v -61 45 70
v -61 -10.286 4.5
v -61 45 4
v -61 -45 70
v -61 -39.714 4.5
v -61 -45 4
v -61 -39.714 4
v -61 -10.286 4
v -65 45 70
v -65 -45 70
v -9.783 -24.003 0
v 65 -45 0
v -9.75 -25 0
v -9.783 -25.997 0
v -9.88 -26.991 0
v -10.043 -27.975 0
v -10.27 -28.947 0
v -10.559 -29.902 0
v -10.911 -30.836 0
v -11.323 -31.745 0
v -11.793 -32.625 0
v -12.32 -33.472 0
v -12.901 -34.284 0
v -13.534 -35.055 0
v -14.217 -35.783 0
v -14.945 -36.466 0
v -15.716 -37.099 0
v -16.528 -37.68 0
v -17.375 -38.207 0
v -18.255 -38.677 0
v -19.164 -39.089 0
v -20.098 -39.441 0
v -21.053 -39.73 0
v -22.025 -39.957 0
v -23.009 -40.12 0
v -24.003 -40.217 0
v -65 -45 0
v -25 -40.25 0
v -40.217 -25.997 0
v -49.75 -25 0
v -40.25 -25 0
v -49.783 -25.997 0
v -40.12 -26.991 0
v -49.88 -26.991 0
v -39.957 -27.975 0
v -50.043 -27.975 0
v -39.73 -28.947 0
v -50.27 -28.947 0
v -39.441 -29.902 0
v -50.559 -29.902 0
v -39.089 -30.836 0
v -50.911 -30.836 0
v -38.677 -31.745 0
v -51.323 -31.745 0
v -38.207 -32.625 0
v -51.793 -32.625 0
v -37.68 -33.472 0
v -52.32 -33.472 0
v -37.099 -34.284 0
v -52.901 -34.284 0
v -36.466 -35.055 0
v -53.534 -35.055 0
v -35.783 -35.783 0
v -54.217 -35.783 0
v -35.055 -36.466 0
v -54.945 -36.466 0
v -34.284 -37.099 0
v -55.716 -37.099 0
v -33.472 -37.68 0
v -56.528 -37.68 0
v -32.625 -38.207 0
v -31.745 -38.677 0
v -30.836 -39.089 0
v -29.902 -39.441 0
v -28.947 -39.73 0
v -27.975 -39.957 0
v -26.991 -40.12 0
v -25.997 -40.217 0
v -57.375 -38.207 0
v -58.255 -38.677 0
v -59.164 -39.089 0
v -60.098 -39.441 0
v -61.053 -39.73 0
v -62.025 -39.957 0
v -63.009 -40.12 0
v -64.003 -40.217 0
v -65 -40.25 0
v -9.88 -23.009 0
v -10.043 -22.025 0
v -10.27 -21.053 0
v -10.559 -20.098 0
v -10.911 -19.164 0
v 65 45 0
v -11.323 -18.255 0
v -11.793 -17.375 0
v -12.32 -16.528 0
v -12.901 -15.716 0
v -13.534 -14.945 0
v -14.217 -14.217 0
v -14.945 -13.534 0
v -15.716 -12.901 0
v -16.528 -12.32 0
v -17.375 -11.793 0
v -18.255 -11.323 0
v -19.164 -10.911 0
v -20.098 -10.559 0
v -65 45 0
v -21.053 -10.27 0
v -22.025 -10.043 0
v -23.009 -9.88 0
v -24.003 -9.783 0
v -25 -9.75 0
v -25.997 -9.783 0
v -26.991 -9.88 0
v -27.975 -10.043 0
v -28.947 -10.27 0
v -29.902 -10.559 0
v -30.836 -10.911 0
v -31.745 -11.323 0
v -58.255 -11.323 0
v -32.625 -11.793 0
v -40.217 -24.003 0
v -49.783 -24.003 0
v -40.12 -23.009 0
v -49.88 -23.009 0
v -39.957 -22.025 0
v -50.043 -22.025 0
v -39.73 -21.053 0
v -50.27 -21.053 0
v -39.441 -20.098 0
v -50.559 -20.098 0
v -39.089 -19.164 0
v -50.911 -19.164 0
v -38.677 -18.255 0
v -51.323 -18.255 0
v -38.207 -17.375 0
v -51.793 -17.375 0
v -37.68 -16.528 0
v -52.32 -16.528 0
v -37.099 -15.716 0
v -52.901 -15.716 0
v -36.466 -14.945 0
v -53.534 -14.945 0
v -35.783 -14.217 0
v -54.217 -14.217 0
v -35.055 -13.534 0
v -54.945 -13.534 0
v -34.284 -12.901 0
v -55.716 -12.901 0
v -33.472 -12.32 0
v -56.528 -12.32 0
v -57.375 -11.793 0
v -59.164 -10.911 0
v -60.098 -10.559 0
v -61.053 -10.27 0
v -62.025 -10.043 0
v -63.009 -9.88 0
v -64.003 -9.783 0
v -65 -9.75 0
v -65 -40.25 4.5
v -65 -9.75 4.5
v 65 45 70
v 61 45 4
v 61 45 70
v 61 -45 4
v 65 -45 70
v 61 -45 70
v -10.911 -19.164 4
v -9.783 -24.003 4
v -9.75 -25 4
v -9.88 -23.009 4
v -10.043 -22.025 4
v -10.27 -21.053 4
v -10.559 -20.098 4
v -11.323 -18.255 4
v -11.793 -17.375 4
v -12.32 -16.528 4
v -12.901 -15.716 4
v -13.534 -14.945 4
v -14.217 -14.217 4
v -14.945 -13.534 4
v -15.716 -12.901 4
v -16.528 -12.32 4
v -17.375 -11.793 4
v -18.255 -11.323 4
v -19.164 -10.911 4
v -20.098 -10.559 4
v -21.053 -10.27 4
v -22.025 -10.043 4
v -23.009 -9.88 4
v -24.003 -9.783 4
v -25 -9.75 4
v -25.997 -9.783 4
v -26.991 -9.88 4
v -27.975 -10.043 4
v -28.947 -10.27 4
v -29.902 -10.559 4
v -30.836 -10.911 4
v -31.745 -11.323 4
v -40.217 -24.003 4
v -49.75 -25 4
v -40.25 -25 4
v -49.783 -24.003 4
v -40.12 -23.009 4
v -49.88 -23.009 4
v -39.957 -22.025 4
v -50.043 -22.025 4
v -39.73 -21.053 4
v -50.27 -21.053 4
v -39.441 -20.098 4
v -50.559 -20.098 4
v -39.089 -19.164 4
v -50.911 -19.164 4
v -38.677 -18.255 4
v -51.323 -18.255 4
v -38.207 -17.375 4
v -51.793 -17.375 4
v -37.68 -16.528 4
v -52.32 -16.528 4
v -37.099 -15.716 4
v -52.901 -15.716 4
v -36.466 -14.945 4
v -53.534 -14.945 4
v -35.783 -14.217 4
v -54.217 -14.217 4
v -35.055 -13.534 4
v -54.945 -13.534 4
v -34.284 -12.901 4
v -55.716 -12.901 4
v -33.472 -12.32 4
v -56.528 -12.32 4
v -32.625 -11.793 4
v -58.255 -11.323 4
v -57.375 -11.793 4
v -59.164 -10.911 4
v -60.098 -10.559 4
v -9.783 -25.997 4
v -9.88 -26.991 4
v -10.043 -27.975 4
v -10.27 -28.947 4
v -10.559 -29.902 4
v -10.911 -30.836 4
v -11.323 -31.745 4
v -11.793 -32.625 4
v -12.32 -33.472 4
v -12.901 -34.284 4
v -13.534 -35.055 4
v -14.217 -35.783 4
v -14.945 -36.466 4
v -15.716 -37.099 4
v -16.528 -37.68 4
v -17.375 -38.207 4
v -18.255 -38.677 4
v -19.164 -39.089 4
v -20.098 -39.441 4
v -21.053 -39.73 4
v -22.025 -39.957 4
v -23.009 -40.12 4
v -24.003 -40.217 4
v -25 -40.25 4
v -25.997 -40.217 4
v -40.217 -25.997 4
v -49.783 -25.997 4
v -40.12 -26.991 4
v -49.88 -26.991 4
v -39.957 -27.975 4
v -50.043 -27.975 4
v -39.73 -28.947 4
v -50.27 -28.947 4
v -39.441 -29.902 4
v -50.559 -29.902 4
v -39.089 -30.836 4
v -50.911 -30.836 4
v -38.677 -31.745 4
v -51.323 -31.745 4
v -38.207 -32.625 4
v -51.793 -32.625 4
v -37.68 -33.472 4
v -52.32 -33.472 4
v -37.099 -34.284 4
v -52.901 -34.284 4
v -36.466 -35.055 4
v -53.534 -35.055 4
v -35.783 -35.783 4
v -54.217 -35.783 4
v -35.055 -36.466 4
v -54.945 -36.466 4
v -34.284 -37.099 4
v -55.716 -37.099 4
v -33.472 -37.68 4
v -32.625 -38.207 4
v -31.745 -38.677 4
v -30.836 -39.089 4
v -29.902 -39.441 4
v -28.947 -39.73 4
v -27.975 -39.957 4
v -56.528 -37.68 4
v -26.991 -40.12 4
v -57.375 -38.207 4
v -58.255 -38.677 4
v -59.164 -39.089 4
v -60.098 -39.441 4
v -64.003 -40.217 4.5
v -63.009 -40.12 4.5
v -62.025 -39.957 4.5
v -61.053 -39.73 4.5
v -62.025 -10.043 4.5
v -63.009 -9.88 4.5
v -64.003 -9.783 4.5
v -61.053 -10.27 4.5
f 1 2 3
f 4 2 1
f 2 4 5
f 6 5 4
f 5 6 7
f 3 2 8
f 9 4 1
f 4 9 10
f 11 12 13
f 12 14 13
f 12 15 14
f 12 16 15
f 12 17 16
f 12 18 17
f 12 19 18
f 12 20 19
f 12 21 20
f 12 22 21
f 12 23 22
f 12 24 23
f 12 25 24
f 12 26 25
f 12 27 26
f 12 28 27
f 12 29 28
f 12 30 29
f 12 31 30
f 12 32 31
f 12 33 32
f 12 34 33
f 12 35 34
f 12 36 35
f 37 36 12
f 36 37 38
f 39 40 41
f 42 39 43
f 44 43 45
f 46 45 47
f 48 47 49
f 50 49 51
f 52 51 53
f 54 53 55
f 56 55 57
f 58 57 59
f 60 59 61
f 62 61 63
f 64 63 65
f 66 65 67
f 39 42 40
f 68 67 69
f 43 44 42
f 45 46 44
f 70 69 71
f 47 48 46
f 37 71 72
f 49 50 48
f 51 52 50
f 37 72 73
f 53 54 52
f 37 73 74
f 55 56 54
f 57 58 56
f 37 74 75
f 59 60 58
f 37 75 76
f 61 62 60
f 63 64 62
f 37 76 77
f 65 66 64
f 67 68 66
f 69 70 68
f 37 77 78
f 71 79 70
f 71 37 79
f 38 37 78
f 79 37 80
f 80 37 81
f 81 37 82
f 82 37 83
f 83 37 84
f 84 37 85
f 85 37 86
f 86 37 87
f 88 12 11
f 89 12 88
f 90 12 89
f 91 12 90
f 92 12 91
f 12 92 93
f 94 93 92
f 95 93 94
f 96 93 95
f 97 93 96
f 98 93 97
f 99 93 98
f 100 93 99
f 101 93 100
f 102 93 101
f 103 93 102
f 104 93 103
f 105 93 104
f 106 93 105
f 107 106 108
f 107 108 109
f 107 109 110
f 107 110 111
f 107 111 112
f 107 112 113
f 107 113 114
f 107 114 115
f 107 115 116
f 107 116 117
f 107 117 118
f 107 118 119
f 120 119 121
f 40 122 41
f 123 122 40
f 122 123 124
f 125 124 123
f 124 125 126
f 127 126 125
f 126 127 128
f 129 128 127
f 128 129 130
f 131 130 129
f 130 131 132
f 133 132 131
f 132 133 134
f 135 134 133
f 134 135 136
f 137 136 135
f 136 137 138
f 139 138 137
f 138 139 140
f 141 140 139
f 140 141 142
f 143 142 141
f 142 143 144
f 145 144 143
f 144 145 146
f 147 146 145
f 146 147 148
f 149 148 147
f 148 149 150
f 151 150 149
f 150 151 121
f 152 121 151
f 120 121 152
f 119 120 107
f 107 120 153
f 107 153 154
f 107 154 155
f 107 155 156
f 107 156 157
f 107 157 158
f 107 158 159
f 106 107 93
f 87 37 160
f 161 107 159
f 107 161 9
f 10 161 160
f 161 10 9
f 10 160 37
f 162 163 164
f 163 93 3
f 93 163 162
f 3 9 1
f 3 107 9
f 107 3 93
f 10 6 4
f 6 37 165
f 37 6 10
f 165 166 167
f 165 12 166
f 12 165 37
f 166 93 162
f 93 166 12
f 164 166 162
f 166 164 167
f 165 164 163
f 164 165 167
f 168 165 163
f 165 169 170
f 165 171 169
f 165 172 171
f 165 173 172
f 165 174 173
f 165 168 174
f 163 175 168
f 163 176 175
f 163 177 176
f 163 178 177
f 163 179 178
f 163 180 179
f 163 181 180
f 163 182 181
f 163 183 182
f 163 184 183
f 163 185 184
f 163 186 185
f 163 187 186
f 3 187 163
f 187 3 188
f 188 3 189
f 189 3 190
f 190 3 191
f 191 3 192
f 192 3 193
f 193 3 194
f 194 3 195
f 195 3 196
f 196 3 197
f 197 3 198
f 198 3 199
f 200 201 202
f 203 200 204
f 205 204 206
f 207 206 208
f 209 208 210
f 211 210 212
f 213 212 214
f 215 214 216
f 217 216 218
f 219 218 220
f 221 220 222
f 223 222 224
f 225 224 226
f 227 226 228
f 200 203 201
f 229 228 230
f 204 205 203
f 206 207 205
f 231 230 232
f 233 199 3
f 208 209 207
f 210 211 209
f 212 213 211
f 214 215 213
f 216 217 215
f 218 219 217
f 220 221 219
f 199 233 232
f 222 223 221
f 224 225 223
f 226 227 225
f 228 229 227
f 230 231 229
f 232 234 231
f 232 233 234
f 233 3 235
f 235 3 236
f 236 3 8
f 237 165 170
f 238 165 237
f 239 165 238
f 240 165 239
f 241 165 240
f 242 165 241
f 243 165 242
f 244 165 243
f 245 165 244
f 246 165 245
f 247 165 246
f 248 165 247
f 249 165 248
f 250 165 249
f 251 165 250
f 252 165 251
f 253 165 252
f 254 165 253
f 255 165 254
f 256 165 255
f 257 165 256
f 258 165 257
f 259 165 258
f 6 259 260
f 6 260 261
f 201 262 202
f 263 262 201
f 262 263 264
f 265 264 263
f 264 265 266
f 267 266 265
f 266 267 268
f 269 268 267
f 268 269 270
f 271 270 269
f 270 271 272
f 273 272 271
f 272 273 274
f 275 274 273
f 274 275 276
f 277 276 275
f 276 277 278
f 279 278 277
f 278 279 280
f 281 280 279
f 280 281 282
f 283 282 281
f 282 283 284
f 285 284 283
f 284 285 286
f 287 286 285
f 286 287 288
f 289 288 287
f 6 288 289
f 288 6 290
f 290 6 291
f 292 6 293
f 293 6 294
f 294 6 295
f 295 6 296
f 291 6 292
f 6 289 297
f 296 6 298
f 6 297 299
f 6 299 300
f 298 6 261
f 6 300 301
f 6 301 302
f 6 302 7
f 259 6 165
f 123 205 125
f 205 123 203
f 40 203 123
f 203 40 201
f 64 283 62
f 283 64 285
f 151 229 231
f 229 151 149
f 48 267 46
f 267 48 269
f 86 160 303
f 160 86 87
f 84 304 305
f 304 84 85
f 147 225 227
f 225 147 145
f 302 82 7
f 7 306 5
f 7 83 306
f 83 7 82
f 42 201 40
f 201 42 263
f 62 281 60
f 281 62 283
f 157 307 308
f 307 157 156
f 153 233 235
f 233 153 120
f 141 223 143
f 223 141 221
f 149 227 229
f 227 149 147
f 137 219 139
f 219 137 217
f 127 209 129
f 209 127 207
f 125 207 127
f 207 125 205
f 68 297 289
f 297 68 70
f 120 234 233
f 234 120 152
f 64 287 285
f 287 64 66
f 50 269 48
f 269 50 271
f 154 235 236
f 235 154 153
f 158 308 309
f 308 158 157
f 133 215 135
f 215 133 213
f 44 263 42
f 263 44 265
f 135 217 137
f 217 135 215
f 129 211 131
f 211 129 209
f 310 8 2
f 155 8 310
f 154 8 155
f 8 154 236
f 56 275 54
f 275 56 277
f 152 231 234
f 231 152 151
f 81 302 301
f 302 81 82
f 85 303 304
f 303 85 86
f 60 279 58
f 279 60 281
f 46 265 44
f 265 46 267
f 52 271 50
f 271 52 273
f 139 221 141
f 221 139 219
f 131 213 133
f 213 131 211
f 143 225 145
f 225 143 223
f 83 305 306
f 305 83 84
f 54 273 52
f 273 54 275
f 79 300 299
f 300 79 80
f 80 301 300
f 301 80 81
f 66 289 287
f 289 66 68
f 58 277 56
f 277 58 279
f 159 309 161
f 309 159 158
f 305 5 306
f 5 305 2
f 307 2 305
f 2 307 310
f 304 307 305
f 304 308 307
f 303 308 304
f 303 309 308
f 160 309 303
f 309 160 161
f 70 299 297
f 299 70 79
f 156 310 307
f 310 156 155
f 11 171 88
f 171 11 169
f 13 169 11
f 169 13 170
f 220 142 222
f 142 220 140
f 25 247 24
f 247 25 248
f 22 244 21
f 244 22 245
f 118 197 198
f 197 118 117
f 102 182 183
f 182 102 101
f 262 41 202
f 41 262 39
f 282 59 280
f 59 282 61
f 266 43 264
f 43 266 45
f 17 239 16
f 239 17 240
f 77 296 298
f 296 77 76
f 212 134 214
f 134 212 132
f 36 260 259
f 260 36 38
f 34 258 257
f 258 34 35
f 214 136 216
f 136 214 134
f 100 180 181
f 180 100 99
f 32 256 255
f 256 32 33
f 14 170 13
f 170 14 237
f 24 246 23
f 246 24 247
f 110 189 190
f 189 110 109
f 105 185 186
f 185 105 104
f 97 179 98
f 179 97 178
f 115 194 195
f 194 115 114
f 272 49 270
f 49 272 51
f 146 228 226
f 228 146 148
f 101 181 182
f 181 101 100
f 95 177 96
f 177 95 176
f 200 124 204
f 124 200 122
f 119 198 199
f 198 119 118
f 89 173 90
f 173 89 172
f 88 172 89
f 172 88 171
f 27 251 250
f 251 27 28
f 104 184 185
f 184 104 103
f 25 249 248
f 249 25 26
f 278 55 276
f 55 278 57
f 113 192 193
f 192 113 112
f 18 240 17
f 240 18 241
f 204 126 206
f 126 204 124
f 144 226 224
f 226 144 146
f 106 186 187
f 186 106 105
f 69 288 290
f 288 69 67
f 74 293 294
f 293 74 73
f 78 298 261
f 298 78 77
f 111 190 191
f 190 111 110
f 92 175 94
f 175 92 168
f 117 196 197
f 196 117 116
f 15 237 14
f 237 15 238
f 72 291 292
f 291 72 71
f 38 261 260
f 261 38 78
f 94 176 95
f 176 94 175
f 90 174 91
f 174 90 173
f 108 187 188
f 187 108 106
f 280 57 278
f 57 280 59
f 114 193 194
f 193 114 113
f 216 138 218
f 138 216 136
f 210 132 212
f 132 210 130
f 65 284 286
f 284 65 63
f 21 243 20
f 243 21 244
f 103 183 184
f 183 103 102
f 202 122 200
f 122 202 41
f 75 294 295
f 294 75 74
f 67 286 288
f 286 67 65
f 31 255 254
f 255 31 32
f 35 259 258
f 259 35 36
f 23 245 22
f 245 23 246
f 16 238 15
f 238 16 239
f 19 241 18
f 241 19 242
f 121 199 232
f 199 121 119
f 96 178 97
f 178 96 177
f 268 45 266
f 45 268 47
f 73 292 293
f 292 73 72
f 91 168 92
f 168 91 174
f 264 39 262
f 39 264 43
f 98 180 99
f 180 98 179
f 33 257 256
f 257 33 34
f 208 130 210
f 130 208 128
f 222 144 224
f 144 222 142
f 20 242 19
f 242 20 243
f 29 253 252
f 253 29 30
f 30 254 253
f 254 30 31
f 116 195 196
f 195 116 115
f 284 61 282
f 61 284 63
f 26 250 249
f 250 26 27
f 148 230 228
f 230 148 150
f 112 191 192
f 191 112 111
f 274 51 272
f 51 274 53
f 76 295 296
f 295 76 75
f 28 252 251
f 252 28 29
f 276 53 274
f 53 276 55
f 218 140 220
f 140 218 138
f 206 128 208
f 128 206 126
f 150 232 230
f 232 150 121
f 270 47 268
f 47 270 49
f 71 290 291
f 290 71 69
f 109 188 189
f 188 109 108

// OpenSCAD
// 6 x 50 mL conical (Falcon-type) tube rack
// Print orientation: flat plate on bed, walls rising to z = 70
// Flip after printing: stands on walls, tubes pass through holes

// ---------- Parameters ----------
plate_x      = 130;   // plate length (X)
plate_y      = 90;    // plate width (Y)
plate_t      = 4;     // plate thickness (Z)

hole_d       = 30.5;  // through-hole diameter
hole_nx      = 3;     // holes along X
hole_ny      = 2;     // holes along Y
hole_pitch   = 40;    // centre-to-centre spacing (both directions)

wall_t       = 4;     // wall thickness (Y)
wall_h       = 70;    // wall top height (Z)

eps          = 0.5;   // cutter overshoot past faces
$fn          = 96;    // curve resolution

// ---------- Model ----------
difference() {
    union() {
        // Base plate
        translate([-plate_x/2, -plate_y/2, 0])
            cube([plate_x, plate_y, plate_t]);

        // Long-edge walls
        for (sx = [-1, 1])
            translate([sx > 0 ? plate_x/2 - wall_t : -plate_x/2,
                       -plate_y/2, 0])
                cube([wall_t, plate_y, wall_h]);
    }

    // Through-holes, centred on plate
    for (i = [0 : hole_nx - 1])
        for (j = [0 : hole_ny - 1])
            translate([(i - (hole_nx - 1)/2) * hole_pitch - plate_x/2,
                       (j - (hole_ny - 1)/2) * hole_pitch - plate_y/2,
                       -eps])
                cylinder(d = hole_d, h = plate_t + 2 * eps);
}
